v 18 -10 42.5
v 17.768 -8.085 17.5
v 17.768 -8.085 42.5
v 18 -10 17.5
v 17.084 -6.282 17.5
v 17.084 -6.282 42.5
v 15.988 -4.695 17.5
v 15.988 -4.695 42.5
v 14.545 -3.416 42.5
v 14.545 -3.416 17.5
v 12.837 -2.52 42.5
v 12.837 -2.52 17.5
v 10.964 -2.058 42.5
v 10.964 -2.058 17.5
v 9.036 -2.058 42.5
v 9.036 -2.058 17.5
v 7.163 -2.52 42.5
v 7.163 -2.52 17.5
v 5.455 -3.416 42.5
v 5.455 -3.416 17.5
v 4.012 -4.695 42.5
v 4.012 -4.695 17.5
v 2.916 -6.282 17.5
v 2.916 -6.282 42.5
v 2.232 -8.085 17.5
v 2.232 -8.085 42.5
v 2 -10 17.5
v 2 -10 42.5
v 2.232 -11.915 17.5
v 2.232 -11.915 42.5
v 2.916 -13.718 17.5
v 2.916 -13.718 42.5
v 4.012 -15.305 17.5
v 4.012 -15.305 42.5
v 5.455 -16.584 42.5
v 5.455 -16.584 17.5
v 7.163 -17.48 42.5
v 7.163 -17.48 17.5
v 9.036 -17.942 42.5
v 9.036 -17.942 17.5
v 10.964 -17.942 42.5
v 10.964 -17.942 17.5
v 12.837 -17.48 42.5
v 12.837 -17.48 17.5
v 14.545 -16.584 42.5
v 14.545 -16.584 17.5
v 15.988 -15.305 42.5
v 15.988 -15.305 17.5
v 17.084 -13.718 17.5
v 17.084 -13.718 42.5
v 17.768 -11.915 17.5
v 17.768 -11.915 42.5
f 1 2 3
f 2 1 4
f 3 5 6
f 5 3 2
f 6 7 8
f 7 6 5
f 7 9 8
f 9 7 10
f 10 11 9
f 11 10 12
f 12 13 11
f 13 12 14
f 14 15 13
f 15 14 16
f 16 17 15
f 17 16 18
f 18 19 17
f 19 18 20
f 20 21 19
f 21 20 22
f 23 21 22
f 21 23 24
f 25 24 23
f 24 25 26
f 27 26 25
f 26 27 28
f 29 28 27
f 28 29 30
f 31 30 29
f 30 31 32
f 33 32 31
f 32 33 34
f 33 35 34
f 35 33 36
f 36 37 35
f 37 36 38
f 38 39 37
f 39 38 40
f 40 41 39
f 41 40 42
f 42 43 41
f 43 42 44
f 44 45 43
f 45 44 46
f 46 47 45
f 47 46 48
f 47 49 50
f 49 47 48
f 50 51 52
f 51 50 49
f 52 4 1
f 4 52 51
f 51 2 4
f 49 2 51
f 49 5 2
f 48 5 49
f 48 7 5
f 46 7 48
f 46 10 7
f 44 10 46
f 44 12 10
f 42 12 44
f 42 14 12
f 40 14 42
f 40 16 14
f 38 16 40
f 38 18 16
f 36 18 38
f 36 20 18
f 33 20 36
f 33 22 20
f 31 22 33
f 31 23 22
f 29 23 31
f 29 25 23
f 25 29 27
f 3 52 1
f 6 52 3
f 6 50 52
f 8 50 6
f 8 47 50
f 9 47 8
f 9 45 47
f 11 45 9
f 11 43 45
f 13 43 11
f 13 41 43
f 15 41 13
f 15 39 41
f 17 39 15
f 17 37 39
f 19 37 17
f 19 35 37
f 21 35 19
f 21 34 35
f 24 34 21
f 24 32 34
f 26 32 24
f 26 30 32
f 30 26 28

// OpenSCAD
// Generated by generate_scads.py
translate([10,-10,30]) {
  cylinder(h=25, r=8, center=true);
}
